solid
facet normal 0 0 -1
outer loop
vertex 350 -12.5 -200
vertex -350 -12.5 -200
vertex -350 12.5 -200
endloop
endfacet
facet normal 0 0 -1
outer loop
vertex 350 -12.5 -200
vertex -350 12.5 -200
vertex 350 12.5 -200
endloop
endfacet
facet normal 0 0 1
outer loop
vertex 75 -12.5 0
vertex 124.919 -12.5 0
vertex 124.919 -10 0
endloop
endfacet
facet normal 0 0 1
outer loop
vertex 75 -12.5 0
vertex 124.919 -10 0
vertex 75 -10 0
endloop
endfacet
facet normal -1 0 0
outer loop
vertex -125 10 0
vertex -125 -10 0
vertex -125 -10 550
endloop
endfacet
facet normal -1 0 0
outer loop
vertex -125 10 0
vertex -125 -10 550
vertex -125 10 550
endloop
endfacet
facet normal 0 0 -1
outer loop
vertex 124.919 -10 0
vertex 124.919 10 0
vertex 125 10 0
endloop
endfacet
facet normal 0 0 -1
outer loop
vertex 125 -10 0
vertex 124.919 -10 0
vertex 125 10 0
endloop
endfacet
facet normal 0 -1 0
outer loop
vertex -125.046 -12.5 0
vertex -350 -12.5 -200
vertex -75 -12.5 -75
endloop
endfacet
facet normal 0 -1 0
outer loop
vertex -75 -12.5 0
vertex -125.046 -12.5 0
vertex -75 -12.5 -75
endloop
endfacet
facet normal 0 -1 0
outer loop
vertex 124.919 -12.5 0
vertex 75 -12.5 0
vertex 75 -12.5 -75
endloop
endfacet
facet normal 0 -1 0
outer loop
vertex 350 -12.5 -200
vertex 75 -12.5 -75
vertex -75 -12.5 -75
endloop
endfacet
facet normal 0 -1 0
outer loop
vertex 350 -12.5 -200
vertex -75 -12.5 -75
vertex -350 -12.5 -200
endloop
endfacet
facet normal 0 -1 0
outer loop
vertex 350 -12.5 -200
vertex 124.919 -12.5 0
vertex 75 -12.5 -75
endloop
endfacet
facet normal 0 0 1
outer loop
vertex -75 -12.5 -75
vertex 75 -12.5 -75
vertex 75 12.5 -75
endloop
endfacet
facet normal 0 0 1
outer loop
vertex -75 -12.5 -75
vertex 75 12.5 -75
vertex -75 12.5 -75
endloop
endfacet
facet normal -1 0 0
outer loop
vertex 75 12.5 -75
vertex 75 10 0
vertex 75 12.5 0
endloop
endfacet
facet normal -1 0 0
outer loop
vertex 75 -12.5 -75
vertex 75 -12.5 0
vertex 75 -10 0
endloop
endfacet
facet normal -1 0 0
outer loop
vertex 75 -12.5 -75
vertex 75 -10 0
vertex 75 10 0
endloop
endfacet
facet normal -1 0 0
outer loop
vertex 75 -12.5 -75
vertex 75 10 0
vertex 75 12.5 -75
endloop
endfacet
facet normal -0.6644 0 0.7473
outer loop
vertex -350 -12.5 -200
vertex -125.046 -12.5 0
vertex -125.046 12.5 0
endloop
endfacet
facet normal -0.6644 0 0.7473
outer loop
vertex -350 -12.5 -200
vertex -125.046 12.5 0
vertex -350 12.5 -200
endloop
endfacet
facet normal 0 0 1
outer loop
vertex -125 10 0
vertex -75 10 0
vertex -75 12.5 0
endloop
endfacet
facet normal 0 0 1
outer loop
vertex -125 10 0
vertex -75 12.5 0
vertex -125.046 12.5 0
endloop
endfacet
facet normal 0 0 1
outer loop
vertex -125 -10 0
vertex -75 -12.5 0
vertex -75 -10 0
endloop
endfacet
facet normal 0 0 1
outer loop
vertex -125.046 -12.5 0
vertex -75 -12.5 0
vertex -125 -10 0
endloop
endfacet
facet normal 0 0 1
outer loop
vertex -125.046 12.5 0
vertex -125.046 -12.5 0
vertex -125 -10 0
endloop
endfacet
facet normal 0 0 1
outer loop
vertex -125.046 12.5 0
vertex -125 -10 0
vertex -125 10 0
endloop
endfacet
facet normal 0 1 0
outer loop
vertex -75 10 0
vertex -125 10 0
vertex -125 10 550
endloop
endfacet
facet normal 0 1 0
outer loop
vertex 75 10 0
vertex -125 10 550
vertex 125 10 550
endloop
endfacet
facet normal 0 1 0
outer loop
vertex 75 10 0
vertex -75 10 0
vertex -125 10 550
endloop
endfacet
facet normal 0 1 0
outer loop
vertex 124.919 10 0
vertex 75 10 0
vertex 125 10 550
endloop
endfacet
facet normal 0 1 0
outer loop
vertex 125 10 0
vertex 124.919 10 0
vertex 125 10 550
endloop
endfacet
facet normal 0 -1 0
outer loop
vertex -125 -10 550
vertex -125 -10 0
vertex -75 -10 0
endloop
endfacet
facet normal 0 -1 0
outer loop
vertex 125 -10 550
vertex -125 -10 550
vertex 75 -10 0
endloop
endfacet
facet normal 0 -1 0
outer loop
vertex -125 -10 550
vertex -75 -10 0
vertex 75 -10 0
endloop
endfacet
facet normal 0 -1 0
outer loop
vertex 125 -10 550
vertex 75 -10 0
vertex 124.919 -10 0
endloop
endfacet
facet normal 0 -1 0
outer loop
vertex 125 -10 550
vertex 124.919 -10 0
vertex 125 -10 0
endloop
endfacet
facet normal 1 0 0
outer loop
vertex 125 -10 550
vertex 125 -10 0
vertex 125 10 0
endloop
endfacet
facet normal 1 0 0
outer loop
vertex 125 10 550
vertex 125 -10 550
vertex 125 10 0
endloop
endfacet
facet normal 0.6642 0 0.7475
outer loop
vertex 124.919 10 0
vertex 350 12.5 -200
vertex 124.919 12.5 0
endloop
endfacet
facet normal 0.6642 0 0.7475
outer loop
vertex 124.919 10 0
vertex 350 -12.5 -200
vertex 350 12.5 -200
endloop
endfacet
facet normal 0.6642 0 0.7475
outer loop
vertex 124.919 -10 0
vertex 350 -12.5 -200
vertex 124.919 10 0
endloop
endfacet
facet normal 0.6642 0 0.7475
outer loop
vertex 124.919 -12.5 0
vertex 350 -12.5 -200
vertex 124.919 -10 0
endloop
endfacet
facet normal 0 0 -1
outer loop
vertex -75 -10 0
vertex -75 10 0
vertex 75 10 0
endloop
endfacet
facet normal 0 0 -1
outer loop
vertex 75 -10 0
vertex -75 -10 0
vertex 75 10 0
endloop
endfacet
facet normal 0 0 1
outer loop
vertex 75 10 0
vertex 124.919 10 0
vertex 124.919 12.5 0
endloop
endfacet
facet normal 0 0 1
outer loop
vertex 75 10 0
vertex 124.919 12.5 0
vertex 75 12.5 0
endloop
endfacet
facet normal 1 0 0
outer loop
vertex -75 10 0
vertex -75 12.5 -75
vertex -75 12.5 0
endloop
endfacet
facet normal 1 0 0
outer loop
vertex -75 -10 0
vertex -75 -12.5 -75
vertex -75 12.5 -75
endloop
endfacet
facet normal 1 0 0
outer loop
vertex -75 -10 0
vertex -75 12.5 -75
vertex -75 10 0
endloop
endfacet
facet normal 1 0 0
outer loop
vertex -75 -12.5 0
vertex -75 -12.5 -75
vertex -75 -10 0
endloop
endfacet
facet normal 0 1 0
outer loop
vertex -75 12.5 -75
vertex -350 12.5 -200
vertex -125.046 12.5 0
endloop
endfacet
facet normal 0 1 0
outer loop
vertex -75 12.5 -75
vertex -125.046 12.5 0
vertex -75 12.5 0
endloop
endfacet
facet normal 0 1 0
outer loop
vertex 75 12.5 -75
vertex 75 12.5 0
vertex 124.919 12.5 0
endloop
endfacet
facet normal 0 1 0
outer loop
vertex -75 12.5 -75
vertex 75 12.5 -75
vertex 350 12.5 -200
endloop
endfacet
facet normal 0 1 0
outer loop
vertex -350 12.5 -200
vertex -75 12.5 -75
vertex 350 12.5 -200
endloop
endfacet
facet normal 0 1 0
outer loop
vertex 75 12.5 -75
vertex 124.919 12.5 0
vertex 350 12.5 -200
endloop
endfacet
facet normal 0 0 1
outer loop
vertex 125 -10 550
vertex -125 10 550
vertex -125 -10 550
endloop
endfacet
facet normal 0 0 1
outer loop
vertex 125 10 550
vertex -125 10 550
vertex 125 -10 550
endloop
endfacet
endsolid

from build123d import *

# Parameters (mm, degrees)
F0_W     = 250
F0_H     = 20
F1_DEPTH = 550
F3_DEPTH = 12.5


with BuildPart() as f1:
    # F0 (on Top) → F1 (new body)
    with BuildSketch(Plane.XY):
        Rectangle(F0_W, F0_H)
    extrude(amount=F1_DEPTH)

    # F2 (on Front) → F3 (join, symmetric)
    with BuildSketch(Plane.XZ):
        Polygon((75, 0), (75, -75), (-75, -75), (-75, 0), (-125.045896, 0), (-350, -200), (350, -200), (124.919437, 0), align=None)
    extrude(amount=F3_DEPTH, both=True)


solid = f1.part
